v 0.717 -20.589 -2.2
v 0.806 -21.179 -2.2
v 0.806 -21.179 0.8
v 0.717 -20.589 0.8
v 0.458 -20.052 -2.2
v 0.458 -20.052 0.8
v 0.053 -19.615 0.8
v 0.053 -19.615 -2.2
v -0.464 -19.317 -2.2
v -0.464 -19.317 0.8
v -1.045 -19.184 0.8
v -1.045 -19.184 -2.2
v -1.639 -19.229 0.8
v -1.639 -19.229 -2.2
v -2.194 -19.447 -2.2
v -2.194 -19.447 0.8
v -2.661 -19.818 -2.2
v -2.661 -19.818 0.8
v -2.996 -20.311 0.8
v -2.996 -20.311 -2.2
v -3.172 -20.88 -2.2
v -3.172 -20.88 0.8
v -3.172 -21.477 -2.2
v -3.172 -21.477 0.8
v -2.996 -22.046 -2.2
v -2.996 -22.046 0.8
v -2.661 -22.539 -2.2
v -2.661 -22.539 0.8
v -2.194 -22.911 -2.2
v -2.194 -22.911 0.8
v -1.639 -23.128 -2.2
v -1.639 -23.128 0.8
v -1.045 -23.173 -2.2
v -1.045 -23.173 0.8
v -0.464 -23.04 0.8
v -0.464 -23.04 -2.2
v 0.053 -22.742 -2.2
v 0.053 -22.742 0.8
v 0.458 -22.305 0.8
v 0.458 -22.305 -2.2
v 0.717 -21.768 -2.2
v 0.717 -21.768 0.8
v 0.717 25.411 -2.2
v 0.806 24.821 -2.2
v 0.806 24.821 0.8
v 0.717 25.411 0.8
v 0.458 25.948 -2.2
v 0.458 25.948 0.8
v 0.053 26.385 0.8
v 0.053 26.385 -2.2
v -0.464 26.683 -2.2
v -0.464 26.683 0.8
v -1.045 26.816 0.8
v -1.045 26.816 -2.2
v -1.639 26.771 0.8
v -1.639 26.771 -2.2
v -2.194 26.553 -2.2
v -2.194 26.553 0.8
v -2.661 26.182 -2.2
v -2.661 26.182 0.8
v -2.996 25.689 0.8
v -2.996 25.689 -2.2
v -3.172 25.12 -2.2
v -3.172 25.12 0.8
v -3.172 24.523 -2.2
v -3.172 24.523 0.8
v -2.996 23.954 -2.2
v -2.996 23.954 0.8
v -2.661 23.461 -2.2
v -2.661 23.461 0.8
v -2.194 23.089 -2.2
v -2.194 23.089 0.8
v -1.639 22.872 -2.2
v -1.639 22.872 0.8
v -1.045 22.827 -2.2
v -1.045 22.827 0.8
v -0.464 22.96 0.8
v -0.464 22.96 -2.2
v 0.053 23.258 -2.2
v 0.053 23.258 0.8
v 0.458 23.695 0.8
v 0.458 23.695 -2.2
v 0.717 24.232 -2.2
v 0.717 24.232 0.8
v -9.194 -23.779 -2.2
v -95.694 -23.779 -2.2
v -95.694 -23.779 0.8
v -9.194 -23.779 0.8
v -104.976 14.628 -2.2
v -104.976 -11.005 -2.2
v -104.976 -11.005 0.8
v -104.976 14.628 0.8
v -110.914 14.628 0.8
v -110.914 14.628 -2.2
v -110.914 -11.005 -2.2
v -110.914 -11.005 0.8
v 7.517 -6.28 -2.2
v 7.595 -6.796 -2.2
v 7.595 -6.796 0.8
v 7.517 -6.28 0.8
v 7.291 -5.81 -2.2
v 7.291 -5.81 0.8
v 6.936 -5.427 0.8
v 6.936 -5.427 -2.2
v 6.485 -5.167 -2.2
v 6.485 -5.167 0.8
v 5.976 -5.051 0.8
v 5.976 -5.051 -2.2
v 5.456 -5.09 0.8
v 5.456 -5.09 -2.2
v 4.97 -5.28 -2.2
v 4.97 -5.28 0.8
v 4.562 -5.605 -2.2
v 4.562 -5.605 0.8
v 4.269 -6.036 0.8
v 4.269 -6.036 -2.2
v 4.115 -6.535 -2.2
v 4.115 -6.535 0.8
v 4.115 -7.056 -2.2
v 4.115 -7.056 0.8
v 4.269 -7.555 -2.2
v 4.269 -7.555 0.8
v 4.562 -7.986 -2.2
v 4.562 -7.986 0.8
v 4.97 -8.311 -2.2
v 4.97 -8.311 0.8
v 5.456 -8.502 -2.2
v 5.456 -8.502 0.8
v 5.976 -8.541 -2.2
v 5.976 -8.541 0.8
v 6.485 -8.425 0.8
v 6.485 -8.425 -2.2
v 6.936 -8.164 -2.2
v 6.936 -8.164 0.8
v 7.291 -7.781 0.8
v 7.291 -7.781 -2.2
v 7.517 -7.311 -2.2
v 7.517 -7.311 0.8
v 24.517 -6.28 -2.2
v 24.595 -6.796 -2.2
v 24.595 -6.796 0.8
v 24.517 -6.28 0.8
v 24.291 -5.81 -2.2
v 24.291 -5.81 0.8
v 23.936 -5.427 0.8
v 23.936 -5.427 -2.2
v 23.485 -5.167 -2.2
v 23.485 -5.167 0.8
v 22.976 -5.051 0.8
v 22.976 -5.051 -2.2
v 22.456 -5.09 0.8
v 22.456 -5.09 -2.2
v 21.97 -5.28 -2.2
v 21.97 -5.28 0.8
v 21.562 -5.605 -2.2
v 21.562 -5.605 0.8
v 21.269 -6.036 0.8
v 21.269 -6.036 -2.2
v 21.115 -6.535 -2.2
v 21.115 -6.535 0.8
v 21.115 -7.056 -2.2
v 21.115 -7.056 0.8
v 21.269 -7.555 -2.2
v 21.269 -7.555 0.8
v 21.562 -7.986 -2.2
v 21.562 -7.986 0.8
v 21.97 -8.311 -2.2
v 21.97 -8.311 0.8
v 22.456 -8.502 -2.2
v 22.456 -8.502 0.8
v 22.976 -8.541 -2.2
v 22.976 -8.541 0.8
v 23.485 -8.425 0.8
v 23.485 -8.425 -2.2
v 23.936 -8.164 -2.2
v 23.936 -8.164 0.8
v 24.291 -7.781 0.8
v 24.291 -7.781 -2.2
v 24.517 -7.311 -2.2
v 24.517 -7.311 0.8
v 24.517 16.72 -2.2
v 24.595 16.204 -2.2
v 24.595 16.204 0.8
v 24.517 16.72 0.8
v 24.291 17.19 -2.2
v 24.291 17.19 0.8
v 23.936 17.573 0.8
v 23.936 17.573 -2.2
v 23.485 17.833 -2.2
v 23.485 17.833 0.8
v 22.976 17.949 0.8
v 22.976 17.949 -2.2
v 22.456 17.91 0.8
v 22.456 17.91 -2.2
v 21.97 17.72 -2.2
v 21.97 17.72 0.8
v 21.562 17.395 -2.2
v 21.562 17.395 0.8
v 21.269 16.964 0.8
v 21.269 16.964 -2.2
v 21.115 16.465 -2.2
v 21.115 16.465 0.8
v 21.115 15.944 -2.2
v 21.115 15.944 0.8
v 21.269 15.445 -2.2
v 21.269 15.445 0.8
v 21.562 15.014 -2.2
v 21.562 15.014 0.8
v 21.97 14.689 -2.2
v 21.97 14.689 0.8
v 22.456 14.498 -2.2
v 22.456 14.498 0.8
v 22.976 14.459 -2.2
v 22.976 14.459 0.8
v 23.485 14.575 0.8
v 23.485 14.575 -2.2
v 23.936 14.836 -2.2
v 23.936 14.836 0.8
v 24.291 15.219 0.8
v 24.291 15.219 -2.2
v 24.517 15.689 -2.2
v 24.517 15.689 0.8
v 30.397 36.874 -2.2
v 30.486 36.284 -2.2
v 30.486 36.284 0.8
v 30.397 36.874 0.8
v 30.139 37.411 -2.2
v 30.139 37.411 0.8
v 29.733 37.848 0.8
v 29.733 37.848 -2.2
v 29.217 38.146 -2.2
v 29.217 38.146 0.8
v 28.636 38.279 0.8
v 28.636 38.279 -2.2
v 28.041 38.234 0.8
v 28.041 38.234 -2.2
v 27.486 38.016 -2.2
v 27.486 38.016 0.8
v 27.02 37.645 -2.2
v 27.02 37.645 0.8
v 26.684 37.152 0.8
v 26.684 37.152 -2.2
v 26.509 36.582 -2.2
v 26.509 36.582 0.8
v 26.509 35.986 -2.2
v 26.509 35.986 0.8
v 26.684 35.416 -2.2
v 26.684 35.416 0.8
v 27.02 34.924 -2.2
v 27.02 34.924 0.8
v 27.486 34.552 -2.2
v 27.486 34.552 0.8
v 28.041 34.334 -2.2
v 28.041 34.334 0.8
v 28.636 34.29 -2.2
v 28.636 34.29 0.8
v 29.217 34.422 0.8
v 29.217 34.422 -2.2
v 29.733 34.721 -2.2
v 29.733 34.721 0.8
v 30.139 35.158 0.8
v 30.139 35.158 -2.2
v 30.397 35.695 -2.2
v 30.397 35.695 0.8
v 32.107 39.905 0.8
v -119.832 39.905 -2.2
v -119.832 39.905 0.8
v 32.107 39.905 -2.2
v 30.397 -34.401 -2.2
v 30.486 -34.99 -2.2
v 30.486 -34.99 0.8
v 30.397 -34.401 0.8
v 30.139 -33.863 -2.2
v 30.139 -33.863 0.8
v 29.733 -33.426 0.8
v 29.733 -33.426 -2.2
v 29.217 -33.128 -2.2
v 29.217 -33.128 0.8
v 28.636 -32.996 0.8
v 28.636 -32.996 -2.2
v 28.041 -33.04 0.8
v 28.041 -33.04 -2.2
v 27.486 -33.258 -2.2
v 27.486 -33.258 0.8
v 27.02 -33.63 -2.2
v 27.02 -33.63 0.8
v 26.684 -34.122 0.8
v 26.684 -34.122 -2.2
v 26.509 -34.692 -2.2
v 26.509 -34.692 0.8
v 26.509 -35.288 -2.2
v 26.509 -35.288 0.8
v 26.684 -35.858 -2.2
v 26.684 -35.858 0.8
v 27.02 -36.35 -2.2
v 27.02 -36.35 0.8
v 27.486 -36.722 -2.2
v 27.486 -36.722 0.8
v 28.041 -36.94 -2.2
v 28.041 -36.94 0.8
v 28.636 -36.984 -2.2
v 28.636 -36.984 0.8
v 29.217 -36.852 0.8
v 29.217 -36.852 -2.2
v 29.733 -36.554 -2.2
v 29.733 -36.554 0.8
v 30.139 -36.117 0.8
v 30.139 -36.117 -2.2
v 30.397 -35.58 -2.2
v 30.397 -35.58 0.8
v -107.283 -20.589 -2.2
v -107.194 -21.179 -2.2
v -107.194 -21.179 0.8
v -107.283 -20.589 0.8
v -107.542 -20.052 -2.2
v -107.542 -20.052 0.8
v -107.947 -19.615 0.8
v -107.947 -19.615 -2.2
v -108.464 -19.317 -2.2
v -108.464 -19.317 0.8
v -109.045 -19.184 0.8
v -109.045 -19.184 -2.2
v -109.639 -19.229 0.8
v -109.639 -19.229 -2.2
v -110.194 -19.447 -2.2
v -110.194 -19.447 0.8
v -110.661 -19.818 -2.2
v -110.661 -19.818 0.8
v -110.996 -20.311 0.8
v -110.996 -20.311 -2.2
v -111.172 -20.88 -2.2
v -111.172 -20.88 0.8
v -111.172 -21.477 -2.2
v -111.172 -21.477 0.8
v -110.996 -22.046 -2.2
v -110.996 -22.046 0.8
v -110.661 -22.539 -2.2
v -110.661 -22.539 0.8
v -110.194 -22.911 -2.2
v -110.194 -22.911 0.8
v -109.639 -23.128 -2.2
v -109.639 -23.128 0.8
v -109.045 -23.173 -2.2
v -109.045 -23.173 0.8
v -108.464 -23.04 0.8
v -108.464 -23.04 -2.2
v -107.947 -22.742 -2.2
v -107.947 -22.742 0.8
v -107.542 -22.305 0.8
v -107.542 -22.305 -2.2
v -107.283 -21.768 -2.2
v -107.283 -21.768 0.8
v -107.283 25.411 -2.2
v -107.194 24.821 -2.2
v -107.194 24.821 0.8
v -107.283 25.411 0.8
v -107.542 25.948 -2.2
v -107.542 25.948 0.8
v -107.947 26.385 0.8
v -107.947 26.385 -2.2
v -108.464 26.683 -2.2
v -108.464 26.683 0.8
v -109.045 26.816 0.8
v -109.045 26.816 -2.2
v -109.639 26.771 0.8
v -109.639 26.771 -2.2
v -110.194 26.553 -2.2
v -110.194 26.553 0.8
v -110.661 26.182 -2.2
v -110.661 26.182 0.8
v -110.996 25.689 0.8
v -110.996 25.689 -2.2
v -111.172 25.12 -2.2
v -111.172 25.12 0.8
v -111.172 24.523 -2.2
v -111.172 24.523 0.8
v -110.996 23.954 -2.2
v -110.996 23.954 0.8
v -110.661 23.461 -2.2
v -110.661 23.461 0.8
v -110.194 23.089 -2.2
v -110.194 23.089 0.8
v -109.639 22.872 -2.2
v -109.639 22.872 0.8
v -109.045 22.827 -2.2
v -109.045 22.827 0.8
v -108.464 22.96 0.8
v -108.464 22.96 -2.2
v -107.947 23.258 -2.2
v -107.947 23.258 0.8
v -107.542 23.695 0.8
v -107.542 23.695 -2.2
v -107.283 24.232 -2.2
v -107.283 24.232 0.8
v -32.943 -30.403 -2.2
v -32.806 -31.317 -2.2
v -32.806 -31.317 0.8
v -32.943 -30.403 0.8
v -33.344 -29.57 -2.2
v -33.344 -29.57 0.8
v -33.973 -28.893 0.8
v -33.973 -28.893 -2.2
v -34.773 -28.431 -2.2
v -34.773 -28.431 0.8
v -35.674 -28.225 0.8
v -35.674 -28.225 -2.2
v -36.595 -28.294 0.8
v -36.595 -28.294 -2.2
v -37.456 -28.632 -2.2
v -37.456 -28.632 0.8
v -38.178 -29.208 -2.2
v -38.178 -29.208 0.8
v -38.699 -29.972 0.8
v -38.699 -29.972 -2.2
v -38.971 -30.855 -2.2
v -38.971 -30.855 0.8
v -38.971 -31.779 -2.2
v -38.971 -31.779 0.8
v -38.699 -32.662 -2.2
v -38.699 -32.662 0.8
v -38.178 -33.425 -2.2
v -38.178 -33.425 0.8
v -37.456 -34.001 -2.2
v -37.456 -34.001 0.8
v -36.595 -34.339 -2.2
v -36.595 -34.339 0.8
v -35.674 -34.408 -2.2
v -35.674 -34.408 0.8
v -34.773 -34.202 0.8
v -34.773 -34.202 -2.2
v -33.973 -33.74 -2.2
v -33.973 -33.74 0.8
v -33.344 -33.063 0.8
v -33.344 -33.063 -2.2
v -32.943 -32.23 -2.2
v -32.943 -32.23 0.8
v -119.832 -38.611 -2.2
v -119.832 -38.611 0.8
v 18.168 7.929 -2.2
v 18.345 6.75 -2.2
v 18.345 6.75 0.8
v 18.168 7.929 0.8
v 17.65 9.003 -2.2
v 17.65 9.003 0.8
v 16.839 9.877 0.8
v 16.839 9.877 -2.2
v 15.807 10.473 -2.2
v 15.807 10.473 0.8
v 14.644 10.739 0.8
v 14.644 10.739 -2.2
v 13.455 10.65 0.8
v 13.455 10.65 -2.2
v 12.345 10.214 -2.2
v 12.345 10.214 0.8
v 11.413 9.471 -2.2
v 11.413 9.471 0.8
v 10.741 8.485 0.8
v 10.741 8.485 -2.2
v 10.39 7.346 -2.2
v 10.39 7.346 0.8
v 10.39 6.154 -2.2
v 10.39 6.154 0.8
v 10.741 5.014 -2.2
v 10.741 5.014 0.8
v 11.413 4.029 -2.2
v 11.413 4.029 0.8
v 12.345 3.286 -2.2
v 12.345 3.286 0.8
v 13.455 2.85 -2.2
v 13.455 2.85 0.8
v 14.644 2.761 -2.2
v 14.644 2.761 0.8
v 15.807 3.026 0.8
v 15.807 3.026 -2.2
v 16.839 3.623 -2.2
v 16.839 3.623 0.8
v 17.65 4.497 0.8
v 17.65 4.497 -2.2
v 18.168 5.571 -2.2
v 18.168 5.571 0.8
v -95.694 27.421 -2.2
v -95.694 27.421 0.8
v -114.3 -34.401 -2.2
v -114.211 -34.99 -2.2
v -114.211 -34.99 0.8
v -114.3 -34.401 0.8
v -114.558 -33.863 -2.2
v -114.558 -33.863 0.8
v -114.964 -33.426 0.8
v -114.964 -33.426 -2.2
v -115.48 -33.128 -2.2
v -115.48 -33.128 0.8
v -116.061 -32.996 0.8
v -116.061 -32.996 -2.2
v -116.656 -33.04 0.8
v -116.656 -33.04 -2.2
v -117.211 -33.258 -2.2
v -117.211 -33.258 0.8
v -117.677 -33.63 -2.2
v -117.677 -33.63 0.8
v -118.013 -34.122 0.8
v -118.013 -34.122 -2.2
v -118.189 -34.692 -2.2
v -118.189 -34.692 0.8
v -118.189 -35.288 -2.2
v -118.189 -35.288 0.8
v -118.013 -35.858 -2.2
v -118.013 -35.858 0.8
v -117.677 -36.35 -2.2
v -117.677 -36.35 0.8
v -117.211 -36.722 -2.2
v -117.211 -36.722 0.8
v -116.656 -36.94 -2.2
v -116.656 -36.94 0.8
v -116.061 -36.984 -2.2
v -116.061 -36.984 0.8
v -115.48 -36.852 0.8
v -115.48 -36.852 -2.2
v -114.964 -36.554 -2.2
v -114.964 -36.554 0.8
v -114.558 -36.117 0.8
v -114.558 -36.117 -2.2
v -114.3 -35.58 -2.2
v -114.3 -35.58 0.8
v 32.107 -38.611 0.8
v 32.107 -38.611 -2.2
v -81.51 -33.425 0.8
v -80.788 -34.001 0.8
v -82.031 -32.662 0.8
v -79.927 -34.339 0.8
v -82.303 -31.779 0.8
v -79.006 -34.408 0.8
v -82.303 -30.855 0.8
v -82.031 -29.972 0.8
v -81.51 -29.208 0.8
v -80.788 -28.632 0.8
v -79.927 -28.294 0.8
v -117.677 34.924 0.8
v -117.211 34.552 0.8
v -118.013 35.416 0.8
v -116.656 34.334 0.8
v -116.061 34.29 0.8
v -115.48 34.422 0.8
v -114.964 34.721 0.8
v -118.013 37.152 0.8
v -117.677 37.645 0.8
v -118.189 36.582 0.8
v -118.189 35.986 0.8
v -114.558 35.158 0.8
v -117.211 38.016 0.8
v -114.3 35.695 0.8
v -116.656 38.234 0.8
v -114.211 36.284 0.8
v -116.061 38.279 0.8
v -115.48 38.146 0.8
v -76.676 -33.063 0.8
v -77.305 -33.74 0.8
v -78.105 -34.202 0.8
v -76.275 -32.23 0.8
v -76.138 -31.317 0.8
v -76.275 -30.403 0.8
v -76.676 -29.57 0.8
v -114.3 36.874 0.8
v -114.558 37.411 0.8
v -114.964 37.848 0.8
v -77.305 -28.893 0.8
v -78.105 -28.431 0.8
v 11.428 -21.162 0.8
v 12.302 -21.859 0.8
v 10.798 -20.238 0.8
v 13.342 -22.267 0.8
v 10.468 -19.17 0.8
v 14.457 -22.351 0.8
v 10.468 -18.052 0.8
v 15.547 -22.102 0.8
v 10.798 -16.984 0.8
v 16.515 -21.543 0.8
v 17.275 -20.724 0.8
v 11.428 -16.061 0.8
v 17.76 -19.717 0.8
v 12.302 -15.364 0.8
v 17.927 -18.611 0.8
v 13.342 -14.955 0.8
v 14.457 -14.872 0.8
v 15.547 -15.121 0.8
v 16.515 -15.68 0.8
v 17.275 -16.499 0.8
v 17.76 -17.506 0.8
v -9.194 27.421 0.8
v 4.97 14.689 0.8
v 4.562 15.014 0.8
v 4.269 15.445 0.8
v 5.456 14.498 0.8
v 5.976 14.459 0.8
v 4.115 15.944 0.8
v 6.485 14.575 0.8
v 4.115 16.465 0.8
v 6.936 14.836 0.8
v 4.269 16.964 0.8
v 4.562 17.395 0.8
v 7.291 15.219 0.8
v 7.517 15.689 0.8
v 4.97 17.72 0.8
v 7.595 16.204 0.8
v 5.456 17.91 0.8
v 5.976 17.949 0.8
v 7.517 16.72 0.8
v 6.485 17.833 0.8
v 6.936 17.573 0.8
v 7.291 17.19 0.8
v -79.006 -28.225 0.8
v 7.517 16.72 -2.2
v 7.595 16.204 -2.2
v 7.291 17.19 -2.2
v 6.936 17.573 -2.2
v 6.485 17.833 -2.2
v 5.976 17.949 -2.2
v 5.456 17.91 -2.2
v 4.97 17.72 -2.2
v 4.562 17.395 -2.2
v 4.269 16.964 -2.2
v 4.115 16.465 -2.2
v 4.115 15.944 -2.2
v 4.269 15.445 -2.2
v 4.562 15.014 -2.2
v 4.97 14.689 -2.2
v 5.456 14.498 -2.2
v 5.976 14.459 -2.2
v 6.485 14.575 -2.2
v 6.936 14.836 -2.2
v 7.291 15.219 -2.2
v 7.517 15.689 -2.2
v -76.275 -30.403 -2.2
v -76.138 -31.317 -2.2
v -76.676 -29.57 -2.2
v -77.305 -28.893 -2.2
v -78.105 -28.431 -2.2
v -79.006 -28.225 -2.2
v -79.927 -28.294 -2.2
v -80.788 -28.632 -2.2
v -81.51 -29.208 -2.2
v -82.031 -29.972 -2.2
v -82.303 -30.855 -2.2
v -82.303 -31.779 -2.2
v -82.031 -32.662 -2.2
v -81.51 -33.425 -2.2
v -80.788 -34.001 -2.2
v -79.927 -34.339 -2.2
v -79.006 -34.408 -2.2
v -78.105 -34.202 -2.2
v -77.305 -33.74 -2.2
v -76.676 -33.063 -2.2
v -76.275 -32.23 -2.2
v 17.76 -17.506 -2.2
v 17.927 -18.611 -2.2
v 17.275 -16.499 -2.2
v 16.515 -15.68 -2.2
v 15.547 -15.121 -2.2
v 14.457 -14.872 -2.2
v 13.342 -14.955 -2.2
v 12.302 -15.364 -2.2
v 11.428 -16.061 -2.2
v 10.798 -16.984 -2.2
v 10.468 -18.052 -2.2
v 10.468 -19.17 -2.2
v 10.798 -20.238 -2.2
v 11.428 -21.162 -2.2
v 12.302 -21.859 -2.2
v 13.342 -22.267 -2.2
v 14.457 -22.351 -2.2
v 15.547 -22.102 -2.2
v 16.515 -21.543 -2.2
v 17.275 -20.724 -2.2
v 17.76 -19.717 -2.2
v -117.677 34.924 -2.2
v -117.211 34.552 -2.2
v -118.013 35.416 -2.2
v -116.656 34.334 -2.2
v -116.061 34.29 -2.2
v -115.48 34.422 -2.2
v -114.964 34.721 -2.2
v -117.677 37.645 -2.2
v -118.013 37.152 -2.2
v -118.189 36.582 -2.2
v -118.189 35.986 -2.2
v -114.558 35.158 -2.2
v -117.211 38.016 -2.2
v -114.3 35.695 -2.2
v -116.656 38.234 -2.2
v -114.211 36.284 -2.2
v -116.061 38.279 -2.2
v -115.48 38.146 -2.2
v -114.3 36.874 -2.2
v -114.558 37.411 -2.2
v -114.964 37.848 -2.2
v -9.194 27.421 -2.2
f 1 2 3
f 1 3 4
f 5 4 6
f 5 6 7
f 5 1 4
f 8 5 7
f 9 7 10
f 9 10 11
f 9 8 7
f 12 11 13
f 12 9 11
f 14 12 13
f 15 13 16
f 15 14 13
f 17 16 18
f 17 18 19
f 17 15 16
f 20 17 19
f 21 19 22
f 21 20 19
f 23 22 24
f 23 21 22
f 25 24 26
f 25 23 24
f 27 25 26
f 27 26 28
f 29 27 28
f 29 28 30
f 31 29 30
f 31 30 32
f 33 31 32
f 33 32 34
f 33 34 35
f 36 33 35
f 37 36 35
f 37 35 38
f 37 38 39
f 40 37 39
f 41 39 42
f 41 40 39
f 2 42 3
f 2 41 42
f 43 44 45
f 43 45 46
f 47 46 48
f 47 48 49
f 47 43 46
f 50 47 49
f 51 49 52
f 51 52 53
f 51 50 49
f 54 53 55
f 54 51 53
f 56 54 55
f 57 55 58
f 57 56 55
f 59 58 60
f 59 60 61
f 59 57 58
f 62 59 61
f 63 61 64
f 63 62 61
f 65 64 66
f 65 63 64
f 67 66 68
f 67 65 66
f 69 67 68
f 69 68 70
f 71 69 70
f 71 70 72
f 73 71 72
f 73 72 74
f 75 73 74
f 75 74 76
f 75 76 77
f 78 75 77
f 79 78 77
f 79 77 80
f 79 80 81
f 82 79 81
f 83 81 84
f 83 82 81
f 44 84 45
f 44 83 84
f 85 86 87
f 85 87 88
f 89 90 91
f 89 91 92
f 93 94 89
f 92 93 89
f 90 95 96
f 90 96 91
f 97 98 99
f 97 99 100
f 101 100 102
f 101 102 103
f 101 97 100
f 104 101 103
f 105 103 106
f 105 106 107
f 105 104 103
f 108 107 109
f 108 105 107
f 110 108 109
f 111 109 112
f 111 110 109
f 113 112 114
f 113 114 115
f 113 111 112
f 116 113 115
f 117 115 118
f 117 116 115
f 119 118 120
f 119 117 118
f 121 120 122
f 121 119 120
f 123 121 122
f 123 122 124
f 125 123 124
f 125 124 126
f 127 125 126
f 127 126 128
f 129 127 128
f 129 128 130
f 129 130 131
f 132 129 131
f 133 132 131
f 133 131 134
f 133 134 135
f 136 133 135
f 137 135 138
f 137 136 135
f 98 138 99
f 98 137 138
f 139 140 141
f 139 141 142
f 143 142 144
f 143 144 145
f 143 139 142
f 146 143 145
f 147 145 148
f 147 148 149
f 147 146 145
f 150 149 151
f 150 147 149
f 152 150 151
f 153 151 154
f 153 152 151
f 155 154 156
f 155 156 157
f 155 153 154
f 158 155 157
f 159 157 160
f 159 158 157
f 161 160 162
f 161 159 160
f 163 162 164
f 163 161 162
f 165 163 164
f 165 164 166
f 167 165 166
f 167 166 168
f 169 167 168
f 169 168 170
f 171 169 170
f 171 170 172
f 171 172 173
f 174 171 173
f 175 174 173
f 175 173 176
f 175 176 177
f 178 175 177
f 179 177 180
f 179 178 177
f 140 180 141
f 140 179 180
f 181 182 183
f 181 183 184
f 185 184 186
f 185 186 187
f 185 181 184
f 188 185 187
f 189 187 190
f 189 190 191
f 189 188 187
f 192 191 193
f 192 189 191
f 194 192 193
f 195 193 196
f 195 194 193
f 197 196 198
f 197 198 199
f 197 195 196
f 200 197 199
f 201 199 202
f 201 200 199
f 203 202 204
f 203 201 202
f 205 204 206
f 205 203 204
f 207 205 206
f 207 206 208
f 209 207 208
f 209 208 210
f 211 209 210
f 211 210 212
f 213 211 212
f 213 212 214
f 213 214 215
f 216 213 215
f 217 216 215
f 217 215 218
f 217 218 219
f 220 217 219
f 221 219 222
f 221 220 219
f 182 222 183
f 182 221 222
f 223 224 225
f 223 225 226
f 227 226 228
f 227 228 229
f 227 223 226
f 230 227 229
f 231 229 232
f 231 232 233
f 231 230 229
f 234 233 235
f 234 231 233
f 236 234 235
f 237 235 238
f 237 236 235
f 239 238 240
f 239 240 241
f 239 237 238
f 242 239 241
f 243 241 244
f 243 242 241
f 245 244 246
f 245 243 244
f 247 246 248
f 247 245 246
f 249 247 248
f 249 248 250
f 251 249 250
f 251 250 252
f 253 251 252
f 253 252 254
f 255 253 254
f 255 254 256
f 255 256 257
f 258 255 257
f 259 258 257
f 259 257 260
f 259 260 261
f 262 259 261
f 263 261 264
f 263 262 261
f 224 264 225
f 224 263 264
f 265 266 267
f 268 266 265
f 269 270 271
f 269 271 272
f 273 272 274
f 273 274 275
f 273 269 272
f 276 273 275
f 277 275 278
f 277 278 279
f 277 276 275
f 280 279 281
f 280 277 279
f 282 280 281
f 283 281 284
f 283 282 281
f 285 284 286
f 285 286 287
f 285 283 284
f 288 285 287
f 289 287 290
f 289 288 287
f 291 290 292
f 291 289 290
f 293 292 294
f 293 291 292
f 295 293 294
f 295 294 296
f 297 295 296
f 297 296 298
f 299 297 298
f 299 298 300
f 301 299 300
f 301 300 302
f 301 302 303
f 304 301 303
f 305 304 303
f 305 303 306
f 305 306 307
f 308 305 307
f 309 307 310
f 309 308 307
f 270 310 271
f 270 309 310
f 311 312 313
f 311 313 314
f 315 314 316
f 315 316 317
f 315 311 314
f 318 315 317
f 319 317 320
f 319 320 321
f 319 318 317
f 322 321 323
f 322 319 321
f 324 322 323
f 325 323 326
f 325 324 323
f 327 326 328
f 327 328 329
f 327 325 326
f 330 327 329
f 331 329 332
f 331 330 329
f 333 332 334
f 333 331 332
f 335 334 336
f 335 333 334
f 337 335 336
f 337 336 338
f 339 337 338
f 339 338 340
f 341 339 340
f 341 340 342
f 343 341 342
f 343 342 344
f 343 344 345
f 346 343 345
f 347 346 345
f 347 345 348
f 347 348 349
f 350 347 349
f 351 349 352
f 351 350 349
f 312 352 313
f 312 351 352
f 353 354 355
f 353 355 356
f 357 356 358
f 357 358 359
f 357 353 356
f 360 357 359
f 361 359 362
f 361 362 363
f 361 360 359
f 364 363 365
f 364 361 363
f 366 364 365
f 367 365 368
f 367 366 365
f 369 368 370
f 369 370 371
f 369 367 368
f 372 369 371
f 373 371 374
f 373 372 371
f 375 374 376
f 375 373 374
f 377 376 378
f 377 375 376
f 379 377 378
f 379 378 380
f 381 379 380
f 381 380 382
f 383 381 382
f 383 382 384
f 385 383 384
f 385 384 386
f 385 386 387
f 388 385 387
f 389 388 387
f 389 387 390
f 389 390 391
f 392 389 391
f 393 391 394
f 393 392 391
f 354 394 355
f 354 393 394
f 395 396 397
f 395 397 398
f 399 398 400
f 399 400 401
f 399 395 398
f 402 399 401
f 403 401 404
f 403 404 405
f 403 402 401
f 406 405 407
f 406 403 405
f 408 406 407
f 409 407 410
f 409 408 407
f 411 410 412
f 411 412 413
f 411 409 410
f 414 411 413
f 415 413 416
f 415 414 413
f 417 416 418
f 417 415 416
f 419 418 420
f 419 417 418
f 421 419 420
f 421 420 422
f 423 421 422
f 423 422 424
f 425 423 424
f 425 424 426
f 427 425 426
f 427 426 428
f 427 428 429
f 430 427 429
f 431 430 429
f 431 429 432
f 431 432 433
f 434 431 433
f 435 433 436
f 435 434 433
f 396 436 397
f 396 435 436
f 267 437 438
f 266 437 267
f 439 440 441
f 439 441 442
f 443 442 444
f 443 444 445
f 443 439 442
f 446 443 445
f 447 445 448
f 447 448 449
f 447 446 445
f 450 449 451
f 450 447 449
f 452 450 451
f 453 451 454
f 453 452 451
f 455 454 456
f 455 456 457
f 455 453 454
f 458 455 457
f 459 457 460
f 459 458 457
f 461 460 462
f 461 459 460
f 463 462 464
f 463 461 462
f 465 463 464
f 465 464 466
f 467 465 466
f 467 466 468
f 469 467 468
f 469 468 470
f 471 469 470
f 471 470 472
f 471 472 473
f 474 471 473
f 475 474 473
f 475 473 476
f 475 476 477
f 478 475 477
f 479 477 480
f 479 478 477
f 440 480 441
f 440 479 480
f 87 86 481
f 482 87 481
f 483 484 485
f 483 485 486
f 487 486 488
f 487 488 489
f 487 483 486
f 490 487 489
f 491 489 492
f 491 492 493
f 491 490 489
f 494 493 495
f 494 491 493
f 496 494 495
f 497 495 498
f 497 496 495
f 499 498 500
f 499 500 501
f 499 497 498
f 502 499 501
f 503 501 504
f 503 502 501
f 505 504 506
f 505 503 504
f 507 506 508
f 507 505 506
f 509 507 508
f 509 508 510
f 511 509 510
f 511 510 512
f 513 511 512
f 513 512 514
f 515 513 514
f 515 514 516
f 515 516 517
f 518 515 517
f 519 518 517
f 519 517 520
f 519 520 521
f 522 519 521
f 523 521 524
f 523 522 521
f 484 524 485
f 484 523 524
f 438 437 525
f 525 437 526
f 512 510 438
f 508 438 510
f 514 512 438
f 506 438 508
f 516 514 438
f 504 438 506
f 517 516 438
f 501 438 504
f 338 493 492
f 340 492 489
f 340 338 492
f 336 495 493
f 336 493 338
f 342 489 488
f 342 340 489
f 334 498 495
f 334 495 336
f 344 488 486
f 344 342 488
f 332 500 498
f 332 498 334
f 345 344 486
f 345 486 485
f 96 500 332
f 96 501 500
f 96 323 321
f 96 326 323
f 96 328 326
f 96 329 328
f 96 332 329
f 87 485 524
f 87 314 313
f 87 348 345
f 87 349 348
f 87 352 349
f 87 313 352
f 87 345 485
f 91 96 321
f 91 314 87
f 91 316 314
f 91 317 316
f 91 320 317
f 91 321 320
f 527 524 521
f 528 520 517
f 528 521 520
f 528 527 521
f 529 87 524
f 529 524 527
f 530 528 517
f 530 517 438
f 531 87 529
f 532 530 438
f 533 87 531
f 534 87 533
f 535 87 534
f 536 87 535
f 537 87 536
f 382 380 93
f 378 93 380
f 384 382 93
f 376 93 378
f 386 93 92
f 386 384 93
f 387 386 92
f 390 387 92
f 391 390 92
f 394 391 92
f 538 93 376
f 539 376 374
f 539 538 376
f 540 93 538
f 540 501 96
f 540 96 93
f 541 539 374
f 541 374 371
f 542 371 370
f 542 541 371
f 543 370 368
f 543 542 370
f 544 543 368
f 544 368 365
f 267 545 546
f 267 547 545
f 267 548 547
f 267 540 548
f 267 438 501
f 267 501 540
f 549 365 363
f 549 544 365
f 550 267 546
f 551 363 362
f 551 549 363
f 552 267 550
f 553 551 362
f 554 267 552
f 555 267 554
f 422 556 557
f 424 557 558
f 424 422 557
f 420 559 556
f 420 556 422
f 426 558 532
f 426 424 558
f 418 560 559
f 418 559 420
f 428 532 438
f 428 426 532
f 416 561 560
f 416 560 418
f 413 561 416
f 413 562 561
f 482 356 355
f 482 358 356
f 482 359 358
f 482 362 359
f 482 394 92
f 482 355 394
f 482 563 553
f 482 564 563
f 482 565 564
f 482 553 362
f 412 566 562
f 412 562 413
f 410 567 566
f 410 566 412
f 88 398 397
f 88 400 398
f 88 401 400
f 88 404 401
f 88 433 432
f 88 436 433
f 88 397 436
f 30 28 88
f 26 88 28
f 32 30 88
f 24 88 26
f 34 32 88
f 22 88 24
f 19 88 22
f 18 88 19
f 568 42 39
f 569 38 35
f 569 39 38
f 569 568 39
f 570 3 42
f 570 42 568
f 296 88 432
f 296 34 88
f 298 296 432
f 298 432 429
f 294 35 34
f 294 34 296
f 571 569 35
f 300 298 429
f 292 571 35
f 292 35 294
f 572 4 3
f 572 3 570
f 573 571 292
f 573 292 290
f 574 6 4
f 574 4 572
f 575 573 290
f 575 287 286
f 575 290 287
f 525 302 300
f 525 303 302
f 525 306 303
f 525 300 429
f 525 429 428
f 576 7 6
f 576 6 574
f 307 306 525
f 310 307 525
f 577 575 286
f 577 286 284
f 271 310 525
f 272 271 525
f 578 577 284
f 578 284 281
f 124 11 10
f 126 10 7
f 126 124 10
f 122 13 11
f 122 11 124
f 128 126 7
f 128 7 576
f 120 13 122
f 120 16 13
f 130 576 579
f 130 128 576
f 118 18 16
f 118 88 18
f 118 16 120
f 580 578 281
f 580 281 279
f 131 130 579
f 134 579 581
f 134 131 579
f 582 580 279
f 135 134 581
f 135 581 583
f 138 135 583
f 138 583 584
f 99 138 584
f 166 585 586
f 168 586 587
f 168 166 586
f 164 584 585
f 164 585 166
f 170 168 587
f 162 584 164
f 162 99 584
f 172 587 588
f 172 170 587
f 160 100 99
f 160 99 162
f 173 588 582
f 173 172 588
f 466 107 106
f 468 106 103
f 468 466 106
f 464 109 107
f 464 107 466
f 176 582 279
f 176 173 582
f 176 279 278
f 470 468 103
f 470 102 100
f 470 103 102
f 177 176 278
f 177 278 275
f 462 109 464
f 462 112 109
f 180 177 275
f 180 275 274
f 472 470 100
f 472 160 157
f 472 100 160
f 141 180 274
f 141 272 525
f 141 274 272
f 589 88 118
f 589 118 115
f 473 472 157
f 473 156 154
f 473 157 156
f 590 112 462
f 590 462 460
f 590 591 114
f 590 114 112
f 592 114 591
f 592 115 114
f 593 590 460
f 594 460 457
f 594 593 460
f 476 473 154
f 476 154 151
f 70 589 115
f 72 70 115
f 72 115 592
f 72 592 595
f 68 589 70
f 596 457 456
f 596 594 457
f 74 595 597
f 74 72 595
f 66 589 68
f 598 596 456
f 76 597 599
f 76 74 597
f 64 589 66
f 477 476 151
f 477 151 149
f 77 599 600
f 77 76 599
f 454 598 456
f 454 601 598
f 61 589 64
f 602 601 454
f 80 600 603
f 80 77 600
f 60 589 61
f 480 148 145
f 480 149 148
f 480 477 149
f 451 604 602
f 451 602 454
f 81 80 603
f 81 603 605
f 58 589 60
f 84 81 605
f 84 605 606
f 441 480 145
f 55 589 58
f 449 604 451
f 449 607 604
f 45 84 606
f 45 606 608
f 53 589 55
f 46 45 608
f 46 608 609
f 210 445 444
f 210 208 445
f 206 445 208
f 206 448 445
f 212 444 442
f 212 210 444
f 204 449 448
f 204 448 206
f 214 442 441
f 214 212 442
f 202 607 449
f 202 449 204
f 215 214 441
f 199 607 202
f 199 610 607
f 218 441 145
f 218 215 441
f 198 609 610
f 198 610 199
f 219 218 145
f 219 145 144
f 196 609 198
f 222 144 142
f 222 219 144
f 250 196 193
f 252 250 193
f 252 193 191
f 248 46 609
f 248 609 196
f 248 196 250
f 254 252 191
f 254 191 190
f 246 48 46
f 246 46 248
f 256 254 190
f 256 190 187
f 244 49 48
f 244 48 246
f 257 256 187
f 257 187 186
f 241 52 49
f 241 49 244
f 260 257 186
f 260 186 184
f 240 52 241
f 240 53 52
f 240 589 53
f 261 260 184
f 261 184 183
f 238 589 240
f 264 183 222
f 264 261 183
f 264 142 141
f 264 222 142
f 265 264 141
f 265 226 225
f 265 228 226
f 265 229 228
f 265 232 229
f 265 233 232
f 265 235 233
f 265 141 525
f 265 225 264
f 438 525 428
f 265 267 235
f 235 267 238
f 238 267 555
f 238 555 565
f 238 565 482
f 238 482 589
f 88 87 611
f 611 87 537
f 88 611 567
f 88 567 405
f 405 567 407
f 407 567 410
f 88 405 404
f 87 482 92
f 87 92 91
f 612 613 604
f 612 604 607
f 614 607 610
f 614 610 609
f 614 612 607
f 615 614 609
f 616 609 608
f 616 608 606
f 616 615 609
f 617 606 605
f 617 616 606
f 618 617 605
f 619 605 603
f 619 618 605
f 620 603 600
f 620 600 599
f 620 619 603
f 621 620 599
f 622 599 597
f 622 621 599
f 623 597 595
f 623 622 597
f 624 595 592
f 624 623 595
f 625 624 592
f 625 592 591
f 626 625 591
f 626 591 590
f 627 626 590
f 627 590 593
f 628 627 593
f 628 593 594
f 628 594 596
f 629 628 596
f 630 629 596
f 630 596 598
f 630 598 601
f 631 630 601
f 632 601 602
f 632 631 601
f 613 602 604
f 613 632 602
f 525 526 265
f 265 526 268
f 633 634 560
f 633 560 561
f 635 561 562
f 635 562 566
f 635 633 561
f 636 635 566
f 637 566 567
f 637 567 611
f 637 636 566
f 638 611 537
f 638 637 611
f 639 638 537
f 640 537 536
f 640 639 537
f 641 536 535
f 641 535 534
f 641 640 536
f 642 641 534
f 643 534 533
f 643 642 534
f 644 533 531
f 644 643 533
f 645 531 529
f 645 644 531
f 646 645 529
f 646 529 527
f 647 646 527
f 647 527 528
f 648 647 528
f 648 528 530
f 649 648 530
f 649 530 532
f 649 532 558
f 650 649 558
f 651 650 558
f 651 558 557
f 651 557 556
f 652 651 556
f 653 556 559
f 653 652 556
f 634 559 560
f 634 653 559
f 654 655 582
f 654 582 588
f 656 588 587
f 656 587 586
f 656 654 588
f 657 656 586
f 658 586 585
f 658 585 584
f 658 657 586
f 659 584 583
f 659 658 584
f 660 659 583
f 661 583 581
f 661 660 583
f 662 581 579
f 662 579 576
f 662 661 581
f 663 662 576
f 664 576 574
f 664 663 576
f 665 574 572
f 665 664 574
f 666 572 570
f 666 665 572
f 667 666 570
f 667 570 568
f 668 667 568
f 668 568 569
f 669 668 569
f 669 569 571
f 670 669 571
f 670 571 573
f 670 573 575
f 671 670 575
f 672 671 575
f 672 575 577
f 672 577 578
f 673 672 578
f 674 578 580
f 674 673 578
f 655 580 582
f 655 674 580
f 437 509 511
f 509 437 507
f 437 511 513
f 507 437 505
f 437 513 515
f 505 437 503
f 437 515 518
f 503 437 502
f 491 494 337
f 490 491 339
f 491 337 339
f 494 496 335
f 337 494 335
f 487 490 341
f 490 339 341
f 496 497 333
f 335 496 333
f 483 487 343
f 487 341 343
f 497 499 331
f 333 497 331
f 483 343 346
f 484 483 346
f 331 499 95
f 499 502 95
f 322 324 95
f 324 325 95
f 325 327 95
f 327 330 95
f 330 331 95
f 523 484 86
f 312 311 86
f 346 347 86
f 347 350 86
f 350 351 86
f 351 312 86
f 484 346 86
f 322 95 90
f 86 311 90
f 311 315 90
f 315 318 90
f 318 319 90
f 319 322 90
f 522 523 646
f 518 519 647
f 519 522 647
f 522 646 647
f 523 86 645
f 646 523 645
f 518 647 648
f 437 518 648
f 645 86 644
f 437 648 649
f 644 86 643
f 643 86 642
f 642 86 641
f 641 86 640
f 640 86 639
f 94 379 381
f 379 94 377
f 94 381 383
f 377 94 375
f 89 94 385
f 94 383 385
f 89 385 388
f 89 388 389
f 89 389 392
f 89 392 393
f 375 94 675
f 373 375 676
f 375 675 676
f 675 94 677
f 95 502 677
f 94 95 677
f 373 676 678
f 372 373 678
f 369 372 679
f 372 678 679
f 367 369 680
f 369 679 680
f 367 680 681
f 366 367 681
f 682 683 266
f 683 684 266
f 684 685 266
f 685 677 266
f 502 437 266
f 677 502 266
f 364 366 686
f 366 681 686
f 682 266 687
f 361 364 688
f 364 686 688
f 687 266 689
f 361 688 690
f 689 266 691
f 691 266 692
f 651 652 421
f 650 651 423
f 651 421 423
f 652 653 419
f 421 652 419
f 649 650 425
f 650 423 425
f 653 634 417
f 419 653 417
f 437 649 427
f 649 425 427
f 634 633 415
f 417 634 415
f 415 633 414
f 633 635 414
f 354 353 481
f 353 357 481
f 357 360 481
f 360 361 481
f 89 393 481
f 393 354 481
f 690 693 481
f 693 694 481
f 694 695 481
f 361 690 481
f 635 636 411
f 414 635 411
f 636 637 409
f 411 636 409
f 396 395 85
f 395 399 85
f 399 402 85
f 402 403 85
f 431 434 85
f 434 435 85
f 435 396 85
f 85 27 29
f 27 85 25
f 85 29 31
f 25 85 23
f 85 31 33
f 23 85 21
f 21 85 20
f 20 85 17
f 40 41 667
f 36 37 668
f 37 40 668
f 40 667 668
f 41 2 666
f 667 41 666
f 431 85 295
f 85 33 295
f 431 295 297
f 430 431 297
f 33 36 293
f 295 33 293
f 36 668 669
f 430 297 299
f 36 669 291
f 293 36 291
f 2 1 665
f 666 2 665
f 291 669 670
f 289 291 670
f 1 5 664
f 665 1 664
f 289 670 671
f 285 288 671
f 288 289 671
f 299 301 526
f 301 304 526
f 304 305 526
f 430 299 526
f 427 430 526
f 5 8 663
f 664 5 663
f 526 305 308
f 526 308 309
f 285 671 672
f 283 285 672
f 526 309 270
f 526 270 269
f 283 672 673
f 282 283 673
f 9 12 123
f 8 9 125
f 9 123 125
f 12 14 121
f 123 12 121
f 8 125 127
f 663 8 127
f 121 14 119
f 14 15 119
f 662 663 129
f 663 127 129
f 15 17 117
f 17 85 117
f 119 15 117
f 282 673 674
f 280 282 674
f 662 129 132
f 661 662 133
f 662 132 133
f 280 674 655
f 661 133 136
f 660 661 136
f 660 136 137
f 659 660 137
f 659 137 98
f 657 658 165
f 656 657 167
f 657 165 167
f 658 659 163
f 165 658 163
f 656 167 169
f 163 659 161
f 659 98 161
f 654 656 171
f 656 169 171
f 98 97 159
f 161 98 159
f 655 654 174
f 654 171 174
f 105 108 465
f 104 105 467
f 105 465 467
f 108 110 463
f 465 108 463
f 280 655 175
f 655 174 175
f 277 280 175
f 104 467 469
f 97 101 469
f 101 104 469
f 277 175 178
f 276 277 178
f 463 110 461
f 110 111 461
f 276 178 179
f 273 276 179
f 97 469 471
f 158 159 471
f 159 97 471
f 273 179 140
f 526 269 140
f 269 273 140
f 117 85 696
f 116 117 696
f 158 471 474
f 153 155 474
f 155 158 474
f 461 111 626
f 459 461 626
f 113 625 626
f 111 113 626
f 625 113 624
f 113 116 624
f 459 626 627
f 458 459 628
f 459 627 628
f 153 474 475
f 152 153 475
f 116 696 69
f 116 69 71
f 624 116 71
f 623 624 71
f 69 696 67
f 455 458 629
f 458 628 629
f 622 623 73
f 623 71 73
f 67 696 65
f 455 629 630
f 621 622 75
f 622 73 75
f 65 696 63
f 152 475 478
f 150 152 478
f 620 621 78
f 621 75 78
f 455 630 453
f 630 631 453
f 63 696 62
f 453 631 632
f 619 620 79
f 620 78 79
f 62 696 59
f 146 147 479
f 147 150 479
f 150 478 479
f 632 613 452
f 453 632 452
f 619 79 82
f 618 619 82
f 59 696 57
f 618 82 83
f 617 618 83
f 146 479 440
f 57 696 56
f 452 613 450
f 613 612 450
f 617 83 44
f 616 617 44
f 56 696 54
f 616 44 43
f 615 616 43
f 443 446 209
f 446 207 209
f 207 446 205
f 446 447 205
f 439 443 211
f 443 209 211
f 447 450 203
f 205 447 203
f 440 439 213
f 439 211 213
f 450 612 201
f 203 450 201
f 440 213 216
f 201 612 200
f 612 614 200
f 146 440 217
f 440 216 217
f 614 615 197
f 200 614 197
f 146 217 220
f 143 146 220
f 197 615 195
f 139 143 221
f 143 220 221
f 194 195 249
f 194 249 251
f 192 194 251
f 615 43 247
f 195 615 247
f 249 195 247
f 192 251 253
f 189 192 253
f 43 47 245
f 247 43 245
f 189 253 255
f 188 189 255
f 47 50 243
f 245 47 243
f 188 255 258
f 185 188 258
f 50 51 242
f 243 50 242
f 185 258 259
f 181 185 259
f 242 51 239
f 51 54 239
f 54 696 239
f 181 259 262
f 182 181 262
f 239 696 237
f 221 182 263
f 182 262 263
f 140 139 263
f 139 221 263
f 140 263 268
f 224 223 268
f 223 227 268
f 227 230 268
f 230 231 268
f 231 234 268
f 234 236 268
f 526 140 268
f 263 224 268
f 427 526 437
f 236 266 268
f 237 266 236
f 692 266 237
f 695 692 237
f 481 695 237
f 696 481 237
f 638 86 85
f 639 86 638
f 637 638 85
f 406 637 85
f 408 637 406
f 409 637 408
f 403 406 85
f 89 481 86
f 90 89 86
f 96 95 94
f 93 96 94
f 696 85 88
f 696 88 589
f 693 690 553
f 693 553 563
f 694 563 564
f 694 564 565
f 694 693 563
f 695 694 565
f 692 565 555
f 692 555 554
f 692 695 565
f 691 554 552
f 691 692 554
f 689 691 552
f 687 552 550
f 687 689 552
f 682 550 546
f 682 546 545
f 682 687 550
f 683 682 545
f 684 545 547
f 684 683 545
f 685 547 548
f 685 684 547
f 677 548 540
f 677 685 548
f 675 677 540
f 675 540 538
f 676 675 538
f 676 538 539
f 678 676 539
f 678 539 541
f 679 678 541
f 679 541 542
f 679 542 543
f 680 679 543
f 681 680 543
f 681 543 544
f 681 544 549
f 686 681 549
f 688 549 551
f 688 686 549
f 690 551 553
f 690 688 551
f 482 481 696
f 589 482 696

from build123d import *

# Parameters (mm, degrees)
ESQUISSE1_W        = 151.93976922
ESQUISSE1_H        = 78.51687395
ESQUISSE1_R        = 2
ESQUISSE1_R_2      = 4
ESQUISSE1_R_3      = 1.75
ESQUISSE1_R_4      = 3.75
ESQUISSE1_R_5      = 3.1
ESQUISSE1_W_2      = 86.5
ESQUISSE1_H_2      = 51.2
ESQUISSE1_W_3      = 5.937566171
ESQUISSE1_H_3      = 25.632907614
BOSS_EXTRU_1_DEPTH = 3


with BuildPart() as part:
    # Esquisse1 → Boss.-Extru.1 (new body)
    with BuildSketch(Plane.XY.offset(-2.2)):
        with Locations((-43.862390942, 0.647054174)):
            Rectangle(ESQUISSE1_W, ESQUISSE1_H)
        with Locations((-109.194417438, 24.821428571)):
            Circle(ESQUISSE1_R, mode=Mode.SUBTRACT)
        with Locations((-109.194417438, -21.178571429)):
            Circle(ESQUISSE1_R, mode=Mode.SUBTRACT)
        with Locations((-1.194417438, -21.178571429)):
            Circle(ESQUISSE1_R, mode=Mode.SUBTRACT)
        with Locations((-1.194417438, 24.821428571)):
            Circle(ESQUISSE1_R, mode=Mode.SUBTRACT)
        with Locations((-116.210955208, 36.284170806)):
            Circle(ESQUISSE1_R, mode=Mode.SUBTRACT)
        with Locations((-116.210955208, -34.990062458)):
            Circle(ESQUISSE1_R, mode=Mode.SUBTRACT)
        with Locations((28.486173324, 36.284170806)):
            Circle(ESQUISSE1_R, mode=Mode.SUBTRACT)
        with Locations((28.486173324, -34.990062458)):
            Circle(ESQUISSE1_R, mode=Mode.SUBTRACT)
        with Locations((14.345224597, 6.749852674)):
            Circle(ESQUISSE1_R_2, mode=Mode.SUBTRACT)
        with Locations((5.845224597, 16.204342535)):
            Circle(ESQUISSE1_R_3, mode=Mode.SUBTRACT)
        with Locations((22.845224597, 16.204342535)):
            Circle(ESQUISSE1_R_3, mode=Mode.SUBTRACT)
        with Locations((22.845224597, -6.795657465)):
            Circle(ESQUISSE1_R_3, mode=Mode.SUBTRACT)
        with Locations((5.845224597, -6.795657465)):
            Circle(ESQUISSE1_R_3, mode=Mode.SUBTRACT)
        with Locations((14.176552179, -18.611382801)):
            Circle(ESQUISSE1_R_4, mode=Mode.SUBTRACT)
        with Locations((-79.237508709, -31.316718293)):
            Circle(ESQUISSE1_R_5, mode=Mode.SUBTRACT)
        with Locations((-35.905557573, -31.316718293)):
            Circle(ESQUISSE1_R_5, mode=Mode.SUBTRACT)
        with Locations((-52.444417438, 1.821428571)):
            Rectangle(ESQUISSE1_W_2, ESQUISSE1_H_2, mode=Mode.SUBTRACT)
        with Locations((-107.94493025, 1.811094224)):
            Rectangle(ESQUISSE1_W_3, ESQUISSE1_H_3, mode=Mode.SUBTRACT)
    extrude(amount=BOSS_EXTRU_1_DEPTH)


solid = part.part
